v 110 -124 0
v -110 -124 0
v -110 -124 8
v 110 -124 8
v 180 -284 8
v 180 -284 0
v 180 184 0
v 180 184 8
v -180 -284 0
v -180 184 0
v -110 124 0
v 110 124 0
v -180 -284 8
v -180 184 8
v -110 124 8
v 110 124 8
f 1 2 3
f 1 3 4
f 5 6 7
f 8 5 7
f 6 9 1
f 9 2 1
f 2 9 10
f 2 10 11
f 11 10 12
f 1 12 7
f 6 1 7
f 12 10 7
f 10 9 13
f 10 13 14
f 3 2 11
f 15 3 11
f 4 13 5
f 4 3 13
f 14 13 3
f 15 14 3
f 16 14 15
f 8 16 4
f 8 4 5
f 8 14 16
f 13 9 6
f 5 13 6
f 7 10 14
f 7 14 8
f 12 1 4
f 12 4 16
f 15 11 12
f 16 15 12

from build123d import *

# Parameters (mm, degrees)
SKETCH1_W           = 360
SKETCH1_H           = 90
SKETCH1_H_2         = 378
SKETCH1_W_2         = 220
SKETCH1_H_3         = 248
BOSS_EXTRUDE1_DEPTH = 8


with BuildPart() as part:
    # Sketch1 → Boss-Extrude1 (new body)
    # profile 1 of 2: a face of its own
    with BuildSketch(Plane.XY):
        with Locations((0, -239)):
            Rectangle(SKETCH1_W, SKETCH1_H)
    # profile 2 of 2: a face of its own
    with BuildSketch(Plane.XY):
        with Locations((0, -5)):
            Rectangle(SKETCH1_W, SKETCH1_H_2)
        Rectangle(SKETCH1_W_2, SKETCH1_H_3, mode=Mode.SUBTRACT)
    extrude(amount=BOSS_EXTRUDE1_DEPTH)


solid = part.part
